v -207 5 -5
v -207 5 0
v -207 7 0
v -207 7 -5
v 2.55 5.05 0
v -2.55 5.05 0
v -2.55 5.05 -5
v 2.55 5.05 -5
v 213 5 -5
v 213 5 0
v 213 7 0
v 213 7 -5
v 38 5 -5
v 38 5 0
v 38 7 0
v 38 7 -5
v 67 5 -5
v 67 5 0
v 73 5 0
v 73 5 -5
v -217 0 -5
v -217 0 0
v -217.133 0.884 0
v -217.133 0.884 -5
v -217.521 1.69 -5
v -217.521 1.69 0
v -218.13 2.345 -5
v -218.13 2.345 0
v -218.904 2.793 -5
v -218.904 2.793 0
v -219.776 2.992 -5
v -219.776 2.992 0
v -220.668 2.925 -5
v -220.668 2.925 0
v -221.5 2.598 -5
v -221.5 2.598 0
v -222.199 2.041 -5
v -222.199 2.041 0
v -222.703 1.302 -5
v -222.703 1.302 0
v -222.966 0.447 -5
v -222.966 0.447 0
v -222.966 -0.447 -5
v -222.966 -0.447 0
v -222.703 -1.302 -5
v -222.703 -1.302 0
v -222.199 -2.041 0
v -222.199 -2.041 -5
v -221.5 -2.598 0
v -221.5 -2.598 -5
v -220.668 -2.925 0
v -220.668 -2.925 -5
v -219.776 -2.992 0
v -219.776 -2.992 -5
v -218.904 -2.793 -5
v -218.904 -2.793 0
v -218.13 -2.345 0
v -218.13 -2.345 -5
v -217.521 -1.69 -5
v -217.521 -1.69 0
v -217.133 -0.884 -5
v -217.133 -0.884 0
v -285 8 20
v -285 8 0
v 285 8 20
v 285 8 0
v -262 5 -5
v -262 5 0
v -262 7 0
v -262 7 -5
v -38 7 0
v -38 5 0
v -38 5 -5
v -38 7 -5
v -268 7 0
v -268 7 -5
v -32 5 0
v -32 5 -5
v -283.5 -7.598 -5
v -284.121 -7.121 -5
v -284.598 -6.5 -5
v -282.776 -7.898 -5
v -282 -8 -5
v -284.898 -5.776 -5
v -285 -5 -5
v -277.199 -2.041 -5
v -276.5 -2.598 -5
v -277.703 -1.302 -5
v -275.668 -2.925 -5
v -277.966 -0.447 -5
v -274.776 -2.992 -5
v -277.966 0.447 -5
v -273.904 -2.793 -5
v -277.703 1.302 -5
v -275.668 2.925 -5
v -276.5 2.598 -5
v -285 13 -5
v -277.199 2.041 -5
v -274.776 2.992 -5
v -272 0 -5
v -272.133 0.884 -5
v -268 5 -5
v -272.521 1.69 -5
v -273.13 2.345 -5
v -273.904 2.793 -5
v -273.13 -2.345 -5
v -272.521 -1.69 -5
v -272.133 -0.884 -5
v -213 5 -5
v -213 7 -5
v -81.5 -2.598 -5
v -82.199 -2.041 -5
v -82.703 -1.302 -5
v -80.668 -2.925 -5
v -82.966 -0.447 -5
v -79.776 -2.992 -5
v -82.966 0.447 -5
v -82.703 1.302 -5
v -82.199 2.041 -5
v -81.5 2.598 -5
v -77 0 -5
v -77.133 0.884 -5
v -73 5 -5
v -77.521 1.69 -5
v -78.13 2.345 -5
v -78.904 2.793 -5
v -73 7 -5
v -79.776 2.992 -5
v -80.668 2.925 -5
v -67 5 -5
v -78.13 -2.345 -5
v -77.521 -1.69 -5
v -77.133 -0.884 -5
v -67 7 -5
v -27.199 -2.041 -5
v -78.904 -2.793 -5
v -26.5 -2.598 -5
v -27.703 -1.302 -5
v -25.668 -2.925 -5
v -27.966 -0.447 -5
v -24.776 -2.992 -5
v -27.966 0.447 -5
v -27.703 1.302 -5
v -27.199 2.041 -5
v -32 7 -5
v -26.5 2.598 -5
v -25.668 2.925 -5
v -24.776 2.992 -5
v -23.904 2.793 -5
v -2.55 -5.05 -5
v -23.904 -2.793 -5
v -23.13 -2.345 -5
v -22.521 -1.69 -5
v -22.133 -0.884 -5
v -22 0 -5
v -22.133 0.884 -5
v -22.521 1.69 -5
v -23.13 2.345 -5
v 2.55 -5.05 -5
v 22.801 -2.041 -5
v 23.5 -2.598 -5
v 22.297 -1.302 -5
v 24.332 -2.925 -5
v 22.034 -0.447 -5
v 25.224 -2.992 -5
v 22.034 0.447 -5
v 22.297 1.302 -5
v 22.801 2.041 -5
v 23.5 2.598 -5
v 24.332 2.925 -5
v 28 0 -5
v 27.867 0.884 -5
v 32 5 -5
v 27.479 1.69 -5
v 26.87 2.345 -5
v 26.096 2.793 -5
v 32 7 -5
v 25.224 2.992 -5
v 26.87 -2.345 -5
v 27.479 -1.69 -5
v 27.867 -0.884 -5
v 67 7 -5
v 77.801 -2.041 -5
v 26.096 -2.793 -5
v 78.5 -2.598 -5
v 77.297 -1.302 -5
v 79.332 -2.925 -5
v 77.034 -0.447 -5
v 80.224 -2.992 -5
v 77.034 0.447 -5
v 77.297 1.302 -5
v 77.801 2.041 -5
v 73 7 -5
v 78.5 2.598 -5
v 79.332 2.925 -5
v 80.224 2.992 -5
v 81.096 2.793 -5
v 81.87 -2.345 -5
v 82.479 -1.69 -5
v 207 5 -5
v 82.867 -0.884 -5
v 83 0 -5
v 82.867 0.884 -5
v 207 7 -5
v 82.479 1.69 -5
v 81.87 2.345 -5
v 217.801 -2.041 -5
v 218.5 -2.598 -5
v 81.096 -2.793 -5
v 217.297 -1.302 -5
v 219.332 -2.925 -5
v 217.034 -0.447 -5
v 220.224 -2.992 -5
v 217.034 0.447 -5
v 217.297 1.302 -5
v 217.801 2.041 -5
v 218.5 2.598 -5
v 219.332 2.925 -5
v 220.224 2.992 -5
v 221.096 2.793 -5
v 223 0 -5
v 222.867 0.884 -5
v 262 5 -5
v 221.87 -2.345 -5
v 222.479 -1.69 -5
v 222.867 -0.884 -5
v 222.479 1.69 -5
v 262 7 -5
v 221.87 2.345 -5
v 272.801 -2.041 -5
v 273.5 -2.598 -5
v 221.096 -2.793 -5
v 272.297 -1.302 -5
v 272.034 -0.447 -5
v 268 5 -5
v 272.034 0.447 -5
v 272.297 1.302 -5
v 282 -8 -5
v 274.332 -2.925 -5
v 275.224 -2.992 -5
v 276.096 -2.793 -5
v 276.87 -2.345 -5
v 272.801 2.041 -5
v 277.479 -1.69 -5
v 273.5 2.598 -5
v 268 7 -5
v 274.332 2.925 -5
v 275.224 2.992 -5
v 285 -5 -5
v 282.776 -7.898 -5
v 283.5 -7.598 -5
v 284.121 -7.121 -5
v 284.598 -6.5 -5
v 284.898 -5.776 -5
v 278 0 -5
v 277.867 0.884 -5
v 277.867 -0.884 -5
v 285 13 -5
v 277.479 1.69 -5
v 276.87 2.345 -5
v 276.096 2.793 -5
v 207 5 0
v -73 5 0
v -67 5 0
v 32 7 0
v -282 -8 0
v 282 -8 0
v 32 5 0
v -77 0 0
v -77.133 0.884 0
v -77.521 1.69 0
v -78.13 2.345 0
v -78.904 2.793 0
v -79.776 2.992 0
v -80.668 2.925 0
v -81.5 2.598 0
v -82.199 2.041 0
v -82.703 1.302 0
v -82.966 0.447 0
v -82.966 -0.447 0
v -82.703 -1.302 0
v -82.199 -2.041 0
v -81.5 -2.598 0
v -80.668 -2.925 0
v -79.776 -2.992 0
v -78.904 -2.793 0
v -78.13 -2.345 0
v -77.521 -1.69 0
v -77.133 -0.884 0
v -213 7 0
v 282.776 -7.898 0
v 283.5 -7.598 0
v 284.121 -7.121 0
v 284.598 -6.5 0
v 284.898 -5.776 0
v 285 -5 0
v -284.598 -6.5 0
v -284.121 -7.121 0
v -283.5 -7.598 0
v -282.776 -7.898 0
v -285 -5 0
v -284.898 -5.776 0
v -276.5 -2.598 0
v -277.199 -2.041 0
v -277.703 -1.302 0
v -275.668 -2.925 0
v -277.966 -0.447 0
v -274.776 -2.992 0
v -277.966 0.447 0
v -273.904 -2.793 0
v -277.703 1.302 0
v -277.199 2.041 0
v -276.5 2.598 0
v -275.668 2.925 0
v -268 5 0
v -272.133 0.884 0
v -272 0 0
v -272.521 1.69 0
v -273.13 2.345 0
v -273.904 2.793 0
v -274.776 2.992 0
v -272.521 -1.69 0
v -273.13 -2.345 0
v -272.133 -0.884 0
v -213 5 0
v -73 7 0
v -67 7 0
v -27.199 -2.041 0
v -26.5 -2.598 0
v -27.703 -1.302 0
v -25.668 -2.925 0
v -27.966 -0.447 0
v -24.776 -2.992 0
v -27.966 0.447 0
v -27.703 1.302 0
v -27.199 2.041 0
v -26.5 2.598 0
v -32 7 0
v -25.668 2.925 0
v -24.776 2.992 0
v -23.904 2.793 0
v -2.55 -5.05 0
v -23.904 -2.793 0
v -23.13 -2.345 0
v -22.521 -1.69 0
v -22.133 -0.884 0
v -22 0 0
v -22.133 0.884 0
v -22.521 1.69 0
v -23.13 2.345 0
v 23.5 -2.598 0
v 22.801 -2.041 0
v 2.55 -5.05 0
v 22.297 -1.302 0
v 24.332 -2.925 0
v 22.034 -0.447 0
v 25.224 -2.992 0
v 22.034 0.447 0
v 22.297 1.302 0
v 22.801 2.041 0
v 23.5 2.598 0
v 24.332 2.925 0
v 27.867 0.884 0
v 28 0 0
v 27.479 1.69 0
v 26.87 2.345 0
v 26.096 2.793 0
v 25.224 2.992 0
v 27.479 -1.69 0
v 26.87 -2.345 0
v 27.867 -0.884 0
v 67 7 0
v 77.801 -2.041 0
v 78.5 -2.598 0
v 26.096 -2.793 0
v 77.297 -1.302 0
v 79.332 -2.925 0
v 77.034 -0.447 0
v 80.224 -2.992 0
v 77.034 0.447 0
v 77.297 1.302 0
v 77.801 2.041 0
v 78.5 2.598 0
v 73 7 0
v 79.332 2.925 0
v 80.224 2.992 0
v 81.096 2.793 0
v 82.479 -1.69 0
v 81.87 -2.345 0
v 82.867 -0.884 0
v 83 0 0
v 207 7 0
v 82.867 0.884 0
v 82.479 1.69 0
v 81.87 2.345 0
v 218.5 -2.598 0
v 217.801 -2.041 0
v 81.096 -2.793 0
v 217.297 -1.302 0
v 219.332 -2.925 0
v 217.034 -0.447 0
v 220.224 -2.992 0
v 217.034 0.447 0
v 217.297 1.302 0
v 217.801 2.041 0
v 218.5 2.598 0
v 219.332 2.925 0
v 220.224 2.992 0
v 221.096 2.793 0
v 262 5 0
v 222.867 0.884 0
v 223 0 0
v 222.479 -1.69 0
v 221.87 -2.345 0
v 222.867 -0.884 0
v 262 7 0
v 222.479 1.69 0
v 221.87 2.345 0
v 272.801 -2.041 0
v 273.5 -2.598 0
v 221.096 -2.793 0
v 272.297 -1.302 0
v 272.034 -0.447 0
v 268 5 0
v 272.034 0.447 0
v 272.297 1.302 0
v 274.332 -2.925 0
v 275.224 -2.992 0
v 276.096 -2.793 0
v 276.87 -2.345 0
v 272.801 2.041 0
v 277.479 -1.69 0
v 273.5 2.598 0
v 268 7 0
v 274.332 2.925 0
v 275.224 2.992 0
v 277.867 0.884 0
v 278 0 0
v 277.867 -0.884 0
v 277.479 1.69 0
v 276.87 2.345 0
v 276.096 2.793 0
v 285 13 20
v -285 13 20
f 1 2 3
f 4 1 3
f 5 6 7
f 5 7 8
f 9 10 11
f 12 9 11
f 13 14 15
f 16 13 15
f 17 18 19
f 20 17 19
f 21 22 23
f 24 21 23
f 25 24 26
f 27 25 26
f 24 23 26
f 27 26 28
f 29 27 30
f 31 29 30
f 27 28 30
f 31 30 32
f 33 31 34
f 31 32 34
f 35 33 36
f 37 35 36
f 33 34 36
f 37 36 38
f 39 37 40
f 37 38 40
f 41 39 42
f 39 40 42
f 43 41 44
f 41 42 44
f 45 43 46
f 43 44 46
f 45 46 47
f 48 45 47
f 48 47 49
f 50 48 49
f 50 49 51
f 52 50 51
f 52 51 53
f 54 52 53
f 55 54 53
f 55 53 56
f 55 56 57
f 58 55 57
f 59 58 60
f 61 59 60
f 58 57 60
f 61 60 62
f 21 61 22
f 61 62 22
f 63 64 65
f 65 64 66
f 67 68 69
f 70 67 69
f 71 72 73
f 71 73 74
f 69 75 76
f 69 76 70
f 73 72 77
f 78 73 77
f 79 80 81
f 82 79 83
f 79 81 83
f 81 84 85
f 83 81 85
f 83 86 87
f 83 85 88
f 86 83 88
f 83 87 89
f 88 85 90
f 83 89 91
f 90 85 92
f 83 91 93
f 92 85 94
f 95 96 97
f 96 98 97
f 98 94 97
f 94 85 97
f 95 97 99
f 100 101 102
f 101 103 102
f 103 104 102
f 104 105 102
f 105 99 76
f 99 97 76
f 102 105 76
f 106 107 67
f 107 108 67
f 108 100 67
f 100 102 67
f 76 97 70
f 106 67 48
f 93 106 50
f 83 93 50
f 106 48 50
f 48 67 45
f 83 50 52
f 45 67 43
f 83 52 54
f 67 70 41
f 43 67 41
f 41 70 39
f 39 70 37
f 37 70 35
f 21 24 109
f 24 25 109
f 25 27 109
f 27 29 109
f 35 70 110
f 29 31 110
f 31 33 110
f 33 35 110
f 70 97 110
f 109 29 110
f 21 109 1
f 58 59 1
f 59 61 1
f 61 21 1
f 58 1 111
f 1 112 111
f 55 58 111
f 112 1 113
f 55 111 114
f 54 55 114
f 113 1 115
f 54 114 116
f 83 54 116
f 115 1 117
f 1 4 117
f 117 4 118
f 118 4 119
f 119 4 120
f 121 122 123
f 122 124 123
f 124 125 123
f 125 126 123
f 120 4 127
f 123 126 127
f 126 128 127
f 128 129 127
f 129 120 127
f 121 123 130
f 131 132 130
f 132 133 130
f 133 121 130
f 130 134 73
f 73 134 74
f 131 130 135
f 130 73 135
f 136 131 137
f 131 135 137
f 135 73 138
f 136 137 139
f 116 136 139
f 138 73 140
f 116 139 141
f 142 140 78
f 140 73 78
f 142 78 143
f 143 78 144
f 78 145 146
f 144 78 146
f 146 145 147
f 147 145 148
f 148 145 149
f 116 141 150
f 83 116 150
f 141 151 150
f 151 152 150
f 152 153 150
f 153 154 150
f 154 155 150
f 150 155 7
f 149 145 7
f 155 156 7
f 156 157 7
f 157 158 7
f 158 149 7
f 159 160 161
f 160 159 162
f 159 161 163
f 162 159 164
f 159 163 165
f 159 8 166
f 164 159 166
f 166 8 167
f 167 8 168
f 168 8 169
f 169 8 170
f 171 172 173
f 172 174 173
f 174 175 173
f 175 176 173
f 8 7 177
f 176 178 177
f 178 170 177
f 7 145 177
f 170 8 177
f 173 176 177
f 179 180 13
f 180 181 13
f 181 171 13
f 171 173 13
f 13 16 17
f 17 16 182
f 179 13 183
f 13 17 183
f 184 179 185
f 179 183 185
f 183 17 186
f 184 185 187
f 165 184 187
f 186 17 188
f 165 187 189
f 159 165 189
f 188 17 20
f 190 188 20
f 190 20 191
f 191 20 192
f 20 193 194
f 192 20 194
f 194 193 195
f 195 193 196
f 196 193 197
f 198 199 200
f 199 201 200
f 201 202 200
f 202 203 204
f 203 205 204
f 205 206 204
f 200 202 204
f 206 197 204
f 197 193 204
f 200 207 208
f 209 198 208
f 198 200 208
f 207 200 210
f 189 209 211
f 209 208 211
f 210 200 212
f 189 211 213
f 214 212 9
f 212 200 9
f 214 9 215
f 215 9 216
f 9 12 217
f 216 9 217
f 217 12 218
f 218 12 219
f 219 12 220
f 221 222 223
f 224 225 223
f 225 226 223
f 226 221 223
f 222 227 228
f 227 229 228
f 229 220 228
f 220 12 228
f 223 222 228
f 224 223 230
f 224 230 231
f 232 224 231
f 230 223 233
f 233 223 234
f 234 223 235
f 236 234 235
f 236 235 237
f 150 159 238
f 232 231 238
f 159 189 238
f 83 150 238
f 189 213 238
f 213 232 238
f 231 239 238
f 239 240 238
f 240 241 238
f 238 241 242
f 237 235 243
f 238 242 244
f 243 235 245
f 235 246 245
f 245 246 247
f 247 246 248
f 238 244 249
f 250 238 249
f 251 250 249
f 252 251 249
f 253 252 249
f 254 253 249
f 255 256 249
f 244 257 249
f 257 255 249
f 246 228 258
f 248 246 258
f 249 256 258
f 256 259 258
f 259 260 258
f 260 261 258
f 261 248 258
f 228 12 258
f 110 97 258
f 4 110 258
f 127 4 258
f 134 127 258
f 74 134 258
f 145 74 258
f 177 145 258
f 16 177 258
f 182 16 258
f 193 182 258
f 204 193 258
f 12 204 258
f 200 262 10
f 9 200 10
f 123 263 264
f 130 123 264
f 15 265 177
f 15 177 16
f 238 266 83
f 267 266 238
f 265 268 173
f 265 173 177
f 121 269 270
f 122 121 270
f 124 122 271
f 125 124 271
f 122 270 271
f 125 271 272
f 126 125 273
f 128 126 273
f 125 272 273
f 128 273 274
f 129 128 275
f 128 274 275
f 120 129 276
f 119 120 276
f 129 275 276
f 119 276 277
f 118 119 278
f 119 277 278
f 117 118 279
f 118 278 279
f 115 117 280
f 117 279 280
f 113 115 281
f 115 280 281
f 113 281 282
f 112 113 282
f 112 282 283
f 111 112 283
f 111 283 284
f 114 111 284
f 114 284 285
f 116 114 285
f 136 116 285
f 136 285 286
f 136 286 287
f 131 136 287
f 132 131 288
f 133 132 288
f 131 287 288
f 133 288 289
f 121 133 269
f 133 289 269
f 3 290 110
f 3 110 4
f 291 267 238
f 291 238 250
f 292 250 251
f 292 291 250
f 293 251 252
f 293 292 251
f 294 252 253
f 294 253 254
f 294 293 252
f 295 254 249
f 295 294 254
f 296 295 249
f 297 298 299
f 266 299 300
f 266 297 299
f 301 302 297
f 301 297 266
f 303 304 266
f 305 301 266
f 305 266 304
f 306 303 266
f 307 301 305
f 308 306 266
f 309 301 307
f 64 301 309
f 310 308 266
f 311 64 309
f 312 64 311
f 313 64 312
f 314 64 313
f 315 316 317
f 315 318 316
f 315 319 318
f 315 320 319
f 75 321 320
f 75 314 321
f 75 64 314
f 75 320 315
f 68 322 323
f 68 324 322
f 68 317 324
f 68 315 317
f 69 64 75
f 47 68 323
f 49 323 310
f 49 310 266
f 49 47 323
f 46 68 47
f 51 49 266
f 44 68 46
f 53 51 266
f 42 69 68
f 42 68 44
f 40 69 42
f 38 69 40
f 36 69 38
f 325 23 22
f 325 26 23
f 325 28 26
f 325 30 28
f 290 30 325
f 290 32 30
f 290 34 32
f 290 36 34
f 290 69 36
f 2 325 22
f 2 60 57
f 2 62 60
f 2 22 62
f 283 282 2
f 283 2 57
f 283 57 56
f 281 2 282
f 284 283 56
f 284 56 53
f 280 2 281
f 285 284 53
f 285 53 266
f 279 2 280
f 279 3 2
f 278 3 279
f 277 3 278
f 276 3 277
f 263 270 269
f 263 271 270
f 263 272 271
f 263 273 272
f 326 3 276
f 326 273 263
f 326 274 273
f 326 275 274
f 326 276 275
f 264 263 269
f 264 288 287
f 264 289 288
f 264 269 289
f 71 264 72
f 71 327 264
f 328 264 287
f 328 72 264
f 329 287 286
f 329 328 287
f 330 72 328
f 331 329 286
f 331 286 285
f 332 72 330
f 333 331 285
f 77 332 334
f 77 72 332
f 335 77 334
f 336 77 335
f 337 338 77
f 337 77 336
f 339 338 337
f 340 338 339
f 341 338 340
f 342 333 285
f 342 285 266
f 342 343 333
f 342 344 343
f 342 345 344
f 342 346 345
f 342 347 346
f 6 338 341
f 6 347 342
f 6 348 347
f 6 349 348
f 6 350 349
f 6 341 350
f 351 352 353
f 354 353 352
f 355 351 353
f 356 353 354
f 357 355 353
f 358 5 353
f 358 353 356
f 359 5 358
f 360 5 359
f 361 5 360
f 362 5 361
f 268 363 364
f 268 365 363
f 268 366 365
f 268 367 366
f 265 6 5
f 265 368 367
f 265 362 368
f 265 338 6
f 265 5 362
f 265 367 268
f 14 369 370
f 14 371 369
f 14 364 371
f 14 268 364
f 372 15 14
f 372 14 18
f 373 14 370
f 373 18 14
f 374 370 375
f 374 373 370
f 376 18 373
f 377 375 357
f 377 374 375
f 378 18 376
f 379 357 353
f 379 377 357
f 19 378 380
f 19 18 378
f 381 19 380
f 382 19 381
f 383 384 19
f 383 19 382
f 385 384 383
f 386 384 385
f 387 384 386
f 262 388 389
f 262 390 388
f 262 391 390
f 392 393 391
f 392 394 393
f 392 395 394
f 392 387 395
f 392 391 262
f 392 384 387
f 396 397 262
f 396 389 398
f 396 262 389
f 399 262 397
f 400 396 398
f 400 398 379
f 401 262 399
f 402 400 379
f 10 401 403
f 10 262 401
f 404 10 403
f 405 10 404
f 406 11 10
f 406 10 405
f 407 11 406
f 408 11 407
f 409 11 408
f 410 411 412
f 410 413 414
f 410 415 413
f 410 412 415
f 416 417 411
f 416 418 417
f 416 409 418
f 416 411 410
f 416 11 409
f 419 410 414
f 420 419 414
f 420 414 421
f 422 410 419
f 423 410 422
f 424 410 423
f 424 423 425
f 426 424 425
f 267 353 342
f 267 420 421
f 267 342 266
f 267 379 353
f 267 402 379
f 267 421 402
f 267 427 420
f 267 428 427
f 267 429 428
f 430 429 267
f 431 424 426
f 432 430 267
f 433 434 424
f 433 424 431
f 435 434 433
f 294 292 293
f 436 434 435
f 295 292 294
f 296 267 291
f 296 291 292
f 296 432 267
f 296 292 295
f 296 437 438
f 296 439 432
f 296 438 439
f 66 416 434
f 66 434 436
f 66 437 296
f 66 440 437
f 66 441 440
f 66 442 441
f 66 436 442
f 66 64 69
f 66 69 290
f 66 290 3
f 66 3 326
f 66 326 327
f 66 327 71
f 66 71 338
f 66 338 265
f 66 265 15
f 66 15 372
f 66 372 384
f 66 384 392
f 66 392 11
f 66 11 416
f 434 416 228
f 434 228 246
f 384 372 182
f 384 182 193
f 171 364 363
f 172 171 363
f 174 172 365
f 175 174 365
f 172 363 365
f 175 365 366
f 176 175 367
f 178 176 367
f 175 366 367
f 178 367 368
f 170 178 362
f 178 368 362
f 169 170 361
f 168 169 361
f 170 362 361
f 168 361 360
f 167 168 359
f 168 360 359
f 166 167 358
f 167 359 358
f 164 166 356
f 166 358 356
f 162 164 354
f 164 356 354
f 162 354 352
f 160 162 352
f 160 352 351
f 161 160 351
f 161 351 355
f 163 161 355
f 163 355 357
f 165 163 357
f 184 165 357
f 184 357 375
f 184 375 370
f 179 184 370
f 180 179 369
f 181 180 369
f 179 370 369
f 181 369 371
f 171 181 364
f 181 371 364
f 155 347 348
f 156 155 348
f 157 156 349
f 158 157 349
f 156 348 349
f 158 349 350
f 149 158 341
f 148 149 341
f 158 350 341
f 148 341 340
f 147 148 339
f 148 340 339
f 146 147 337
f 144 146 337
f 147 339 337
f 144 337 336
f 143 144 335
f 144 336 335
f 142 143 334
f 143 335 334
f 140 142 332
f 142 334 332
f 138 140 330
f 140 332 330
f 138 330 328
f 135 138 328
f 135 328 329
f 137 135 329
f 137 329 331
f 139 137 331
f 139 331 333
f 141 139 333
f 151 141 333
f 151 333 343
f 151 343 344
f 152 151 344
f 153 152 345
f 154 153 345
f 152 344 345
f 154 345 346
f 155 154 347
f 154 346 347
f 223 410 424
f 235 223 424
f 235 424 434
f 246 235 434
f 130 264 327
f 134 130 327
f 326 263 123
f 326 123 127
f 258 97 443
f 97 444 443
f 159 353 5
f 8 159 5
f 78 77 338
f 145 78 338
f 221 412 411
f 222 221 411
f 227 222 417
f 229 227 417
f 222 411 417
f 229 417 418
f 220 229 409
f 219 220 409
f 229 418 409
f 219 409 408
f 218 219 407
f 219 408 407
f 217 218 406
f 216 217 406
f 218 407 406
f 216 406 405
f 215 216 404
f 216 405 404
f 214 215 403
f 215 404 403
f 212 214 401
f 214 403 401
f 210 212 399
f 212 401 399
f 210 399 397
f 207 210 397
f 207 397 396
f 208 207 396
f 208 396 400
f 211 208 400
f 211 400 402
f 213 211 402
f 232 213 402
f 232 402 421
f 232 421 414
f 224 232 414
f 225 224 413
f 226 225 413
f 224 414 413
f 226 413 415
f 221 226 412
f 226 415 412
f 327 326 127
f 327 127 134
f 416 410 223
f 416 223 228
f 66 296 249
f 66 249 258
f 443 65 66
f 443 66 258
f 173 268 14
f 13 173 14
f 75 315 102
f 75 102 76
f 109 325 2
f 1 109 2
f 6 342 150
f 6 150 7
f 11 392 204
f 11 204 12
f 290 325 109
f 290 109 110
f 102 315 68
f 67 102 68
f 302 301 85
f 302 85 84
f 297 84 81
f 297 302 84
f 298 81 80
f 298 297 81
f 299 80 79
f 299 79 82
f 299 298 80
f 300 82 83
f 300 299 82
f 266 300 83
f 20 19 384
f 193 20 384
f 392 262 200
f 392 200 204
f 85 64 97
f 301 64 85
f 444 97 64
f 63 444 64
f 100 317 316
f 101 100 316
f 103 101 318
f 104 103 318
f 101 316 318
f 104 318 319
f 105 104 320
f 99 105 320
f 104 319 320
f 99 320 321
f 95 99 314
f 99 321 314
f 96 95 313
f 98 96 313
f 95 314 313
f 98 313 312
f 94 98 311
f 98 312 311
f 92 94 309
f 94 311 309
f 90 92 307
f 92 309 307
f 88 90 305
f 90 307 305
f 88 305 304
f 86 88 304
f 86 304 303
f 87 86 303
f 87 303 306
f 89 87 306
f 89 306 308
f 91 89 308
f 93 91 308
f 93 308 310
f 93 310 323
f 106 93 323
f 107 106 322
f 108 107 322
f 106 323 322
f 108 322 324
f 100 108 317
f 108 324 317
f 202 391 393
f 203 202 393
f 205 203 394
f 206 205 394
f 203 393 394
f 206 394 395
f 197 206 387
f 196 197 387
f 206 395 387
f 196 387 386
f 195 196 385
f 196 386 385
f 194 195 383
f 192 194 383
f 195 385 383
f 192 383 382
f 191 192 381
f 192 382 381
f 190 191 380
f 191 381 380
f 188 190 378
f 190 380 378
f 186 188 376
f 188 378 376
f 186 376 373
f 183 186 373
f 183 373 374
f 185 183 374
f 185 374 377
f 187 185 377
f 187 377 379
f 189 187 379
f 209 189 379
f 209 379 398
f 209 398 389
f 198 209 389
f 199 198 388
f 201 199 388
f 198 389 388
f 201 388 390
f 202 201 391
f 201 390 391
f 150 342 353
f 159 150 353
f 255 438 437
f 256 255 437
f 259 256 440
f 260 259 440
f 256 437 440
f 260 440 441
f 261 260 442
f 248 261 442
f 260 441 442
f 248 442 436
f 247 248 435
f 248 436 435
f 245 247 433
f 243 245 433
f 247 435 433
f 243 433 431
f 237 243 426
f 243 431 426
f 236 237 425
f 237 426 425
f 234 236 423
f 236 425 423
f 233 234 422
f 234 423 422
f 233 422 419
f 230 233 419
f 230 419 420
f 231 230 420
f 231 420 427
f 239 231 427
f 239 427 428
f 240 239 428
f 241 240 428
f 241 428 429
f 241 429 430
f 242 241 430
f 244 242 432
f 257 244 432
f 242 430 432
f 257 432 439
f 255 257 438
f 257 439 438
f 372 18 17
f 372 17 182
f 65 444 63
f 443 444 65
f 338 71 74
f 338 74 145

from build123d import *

# Parameters (mm, degrees)
F0_W     = 570
F0_H     = 5
F1_DEPTH = 20
F0_R     = 3
F0_W_2   = 5.1
F0_H_2   = 10.1
F0_W_3   = 6
F0_H_3   = 2
F2_DEPTH = 5


with BuildPart() as f1:
    # F0 (on Top) → F1 (new body)
    with BuildSketch(Plane.XY):
        with Locations((0, 10.5)):
            Rectangle(F0_W, F0_H)
    extrude(amount=F1_DEPTH)

    # F0 (on Top) → F2 (join)
    with BuildSketch(Plane.XY):
        with BuildLine():
            ThreePointArc((-285, -5), (-284.12132, -7.12132), (-282, -8))
            Line((-282, -8), (282, -8))
            ThreePointArc((282, -8), (284.12132, -7.12132), (285, -5))
            Line((285, -5), (285, 8))
            Line((285, 8), (-285, 8))
            Line((-285, 8), (-285, -5))
        make_face()
        with Locations((-275, 0)):
            Circle(F0_R, mode=Mode.SUBTRACT)
        with Locations((-220, 0)):
            Circle(F0_R, mode=Mode.SUBTRACT)
        with Locations((-80, 0)):
            Circle(F0_R, mode=Mode.SUBTRACT)
        with Locations((-25, 0)):
            Circle(F0_R, mode=Mode.SUBTRACT)
        Rectangle(F0_W_2, F0_H_2, mode=Mode.SUBTRACT)
        with Locations((25, 0)):
            Circle(F0_R, mode=Mode.SUBTRACT)
        with Locations((80, 0)):
            Circle(F0_R, mode=Mode.SUBTRACT)
        with Locations((220, 0)):
            Circle(F0_R, mode=Mode.SUBTRACT)
        with Locations((275, 0)):
            Circle(F0_R, mode=Mode.SUBTRACT)
        with Locations((-265, 6)):
            Rectangle(F0_W_3, F0_H_3, mode=Mode.SUBTRACT)
        with Locations((-210, 6)):
            Rectangle(F0_W_3, F0_H_3, mode=Mode.SUBTRACT)
        with Locations((-70, 6)):
            Rectangle(F0_W_3, F0_H_3, mode=Mode.SUBTRACT)
        with Locations((-35, 6)):
            Rectangle(F0_W_3, F0_H_3, mode=Mode.SUBTRACT)
        with Locations((35, 6)):
            Rectangle(F0_W_3, F0_H_3, mode=Mode.SUBTRACT)
        with Locations((70, 6)):
            Rectangle(F0_W_3, F0_H_3, mode=Mode.SUBTRACT)
        with Locations((210, 6)):
            Rectangle(F0_W_3, F0_H_3, mode=Mode.SUBTRACT)
        with Locations((265, 6)):
            Rectangle(F0_W_3, F0_H_3, mode=Mode.SUBTRACT)
        with Locations((0, 10.5)):
            Rectangle(F0_W, F0_H)
    extrude(amount=-F2_DEPTH)


solid = f1.part
